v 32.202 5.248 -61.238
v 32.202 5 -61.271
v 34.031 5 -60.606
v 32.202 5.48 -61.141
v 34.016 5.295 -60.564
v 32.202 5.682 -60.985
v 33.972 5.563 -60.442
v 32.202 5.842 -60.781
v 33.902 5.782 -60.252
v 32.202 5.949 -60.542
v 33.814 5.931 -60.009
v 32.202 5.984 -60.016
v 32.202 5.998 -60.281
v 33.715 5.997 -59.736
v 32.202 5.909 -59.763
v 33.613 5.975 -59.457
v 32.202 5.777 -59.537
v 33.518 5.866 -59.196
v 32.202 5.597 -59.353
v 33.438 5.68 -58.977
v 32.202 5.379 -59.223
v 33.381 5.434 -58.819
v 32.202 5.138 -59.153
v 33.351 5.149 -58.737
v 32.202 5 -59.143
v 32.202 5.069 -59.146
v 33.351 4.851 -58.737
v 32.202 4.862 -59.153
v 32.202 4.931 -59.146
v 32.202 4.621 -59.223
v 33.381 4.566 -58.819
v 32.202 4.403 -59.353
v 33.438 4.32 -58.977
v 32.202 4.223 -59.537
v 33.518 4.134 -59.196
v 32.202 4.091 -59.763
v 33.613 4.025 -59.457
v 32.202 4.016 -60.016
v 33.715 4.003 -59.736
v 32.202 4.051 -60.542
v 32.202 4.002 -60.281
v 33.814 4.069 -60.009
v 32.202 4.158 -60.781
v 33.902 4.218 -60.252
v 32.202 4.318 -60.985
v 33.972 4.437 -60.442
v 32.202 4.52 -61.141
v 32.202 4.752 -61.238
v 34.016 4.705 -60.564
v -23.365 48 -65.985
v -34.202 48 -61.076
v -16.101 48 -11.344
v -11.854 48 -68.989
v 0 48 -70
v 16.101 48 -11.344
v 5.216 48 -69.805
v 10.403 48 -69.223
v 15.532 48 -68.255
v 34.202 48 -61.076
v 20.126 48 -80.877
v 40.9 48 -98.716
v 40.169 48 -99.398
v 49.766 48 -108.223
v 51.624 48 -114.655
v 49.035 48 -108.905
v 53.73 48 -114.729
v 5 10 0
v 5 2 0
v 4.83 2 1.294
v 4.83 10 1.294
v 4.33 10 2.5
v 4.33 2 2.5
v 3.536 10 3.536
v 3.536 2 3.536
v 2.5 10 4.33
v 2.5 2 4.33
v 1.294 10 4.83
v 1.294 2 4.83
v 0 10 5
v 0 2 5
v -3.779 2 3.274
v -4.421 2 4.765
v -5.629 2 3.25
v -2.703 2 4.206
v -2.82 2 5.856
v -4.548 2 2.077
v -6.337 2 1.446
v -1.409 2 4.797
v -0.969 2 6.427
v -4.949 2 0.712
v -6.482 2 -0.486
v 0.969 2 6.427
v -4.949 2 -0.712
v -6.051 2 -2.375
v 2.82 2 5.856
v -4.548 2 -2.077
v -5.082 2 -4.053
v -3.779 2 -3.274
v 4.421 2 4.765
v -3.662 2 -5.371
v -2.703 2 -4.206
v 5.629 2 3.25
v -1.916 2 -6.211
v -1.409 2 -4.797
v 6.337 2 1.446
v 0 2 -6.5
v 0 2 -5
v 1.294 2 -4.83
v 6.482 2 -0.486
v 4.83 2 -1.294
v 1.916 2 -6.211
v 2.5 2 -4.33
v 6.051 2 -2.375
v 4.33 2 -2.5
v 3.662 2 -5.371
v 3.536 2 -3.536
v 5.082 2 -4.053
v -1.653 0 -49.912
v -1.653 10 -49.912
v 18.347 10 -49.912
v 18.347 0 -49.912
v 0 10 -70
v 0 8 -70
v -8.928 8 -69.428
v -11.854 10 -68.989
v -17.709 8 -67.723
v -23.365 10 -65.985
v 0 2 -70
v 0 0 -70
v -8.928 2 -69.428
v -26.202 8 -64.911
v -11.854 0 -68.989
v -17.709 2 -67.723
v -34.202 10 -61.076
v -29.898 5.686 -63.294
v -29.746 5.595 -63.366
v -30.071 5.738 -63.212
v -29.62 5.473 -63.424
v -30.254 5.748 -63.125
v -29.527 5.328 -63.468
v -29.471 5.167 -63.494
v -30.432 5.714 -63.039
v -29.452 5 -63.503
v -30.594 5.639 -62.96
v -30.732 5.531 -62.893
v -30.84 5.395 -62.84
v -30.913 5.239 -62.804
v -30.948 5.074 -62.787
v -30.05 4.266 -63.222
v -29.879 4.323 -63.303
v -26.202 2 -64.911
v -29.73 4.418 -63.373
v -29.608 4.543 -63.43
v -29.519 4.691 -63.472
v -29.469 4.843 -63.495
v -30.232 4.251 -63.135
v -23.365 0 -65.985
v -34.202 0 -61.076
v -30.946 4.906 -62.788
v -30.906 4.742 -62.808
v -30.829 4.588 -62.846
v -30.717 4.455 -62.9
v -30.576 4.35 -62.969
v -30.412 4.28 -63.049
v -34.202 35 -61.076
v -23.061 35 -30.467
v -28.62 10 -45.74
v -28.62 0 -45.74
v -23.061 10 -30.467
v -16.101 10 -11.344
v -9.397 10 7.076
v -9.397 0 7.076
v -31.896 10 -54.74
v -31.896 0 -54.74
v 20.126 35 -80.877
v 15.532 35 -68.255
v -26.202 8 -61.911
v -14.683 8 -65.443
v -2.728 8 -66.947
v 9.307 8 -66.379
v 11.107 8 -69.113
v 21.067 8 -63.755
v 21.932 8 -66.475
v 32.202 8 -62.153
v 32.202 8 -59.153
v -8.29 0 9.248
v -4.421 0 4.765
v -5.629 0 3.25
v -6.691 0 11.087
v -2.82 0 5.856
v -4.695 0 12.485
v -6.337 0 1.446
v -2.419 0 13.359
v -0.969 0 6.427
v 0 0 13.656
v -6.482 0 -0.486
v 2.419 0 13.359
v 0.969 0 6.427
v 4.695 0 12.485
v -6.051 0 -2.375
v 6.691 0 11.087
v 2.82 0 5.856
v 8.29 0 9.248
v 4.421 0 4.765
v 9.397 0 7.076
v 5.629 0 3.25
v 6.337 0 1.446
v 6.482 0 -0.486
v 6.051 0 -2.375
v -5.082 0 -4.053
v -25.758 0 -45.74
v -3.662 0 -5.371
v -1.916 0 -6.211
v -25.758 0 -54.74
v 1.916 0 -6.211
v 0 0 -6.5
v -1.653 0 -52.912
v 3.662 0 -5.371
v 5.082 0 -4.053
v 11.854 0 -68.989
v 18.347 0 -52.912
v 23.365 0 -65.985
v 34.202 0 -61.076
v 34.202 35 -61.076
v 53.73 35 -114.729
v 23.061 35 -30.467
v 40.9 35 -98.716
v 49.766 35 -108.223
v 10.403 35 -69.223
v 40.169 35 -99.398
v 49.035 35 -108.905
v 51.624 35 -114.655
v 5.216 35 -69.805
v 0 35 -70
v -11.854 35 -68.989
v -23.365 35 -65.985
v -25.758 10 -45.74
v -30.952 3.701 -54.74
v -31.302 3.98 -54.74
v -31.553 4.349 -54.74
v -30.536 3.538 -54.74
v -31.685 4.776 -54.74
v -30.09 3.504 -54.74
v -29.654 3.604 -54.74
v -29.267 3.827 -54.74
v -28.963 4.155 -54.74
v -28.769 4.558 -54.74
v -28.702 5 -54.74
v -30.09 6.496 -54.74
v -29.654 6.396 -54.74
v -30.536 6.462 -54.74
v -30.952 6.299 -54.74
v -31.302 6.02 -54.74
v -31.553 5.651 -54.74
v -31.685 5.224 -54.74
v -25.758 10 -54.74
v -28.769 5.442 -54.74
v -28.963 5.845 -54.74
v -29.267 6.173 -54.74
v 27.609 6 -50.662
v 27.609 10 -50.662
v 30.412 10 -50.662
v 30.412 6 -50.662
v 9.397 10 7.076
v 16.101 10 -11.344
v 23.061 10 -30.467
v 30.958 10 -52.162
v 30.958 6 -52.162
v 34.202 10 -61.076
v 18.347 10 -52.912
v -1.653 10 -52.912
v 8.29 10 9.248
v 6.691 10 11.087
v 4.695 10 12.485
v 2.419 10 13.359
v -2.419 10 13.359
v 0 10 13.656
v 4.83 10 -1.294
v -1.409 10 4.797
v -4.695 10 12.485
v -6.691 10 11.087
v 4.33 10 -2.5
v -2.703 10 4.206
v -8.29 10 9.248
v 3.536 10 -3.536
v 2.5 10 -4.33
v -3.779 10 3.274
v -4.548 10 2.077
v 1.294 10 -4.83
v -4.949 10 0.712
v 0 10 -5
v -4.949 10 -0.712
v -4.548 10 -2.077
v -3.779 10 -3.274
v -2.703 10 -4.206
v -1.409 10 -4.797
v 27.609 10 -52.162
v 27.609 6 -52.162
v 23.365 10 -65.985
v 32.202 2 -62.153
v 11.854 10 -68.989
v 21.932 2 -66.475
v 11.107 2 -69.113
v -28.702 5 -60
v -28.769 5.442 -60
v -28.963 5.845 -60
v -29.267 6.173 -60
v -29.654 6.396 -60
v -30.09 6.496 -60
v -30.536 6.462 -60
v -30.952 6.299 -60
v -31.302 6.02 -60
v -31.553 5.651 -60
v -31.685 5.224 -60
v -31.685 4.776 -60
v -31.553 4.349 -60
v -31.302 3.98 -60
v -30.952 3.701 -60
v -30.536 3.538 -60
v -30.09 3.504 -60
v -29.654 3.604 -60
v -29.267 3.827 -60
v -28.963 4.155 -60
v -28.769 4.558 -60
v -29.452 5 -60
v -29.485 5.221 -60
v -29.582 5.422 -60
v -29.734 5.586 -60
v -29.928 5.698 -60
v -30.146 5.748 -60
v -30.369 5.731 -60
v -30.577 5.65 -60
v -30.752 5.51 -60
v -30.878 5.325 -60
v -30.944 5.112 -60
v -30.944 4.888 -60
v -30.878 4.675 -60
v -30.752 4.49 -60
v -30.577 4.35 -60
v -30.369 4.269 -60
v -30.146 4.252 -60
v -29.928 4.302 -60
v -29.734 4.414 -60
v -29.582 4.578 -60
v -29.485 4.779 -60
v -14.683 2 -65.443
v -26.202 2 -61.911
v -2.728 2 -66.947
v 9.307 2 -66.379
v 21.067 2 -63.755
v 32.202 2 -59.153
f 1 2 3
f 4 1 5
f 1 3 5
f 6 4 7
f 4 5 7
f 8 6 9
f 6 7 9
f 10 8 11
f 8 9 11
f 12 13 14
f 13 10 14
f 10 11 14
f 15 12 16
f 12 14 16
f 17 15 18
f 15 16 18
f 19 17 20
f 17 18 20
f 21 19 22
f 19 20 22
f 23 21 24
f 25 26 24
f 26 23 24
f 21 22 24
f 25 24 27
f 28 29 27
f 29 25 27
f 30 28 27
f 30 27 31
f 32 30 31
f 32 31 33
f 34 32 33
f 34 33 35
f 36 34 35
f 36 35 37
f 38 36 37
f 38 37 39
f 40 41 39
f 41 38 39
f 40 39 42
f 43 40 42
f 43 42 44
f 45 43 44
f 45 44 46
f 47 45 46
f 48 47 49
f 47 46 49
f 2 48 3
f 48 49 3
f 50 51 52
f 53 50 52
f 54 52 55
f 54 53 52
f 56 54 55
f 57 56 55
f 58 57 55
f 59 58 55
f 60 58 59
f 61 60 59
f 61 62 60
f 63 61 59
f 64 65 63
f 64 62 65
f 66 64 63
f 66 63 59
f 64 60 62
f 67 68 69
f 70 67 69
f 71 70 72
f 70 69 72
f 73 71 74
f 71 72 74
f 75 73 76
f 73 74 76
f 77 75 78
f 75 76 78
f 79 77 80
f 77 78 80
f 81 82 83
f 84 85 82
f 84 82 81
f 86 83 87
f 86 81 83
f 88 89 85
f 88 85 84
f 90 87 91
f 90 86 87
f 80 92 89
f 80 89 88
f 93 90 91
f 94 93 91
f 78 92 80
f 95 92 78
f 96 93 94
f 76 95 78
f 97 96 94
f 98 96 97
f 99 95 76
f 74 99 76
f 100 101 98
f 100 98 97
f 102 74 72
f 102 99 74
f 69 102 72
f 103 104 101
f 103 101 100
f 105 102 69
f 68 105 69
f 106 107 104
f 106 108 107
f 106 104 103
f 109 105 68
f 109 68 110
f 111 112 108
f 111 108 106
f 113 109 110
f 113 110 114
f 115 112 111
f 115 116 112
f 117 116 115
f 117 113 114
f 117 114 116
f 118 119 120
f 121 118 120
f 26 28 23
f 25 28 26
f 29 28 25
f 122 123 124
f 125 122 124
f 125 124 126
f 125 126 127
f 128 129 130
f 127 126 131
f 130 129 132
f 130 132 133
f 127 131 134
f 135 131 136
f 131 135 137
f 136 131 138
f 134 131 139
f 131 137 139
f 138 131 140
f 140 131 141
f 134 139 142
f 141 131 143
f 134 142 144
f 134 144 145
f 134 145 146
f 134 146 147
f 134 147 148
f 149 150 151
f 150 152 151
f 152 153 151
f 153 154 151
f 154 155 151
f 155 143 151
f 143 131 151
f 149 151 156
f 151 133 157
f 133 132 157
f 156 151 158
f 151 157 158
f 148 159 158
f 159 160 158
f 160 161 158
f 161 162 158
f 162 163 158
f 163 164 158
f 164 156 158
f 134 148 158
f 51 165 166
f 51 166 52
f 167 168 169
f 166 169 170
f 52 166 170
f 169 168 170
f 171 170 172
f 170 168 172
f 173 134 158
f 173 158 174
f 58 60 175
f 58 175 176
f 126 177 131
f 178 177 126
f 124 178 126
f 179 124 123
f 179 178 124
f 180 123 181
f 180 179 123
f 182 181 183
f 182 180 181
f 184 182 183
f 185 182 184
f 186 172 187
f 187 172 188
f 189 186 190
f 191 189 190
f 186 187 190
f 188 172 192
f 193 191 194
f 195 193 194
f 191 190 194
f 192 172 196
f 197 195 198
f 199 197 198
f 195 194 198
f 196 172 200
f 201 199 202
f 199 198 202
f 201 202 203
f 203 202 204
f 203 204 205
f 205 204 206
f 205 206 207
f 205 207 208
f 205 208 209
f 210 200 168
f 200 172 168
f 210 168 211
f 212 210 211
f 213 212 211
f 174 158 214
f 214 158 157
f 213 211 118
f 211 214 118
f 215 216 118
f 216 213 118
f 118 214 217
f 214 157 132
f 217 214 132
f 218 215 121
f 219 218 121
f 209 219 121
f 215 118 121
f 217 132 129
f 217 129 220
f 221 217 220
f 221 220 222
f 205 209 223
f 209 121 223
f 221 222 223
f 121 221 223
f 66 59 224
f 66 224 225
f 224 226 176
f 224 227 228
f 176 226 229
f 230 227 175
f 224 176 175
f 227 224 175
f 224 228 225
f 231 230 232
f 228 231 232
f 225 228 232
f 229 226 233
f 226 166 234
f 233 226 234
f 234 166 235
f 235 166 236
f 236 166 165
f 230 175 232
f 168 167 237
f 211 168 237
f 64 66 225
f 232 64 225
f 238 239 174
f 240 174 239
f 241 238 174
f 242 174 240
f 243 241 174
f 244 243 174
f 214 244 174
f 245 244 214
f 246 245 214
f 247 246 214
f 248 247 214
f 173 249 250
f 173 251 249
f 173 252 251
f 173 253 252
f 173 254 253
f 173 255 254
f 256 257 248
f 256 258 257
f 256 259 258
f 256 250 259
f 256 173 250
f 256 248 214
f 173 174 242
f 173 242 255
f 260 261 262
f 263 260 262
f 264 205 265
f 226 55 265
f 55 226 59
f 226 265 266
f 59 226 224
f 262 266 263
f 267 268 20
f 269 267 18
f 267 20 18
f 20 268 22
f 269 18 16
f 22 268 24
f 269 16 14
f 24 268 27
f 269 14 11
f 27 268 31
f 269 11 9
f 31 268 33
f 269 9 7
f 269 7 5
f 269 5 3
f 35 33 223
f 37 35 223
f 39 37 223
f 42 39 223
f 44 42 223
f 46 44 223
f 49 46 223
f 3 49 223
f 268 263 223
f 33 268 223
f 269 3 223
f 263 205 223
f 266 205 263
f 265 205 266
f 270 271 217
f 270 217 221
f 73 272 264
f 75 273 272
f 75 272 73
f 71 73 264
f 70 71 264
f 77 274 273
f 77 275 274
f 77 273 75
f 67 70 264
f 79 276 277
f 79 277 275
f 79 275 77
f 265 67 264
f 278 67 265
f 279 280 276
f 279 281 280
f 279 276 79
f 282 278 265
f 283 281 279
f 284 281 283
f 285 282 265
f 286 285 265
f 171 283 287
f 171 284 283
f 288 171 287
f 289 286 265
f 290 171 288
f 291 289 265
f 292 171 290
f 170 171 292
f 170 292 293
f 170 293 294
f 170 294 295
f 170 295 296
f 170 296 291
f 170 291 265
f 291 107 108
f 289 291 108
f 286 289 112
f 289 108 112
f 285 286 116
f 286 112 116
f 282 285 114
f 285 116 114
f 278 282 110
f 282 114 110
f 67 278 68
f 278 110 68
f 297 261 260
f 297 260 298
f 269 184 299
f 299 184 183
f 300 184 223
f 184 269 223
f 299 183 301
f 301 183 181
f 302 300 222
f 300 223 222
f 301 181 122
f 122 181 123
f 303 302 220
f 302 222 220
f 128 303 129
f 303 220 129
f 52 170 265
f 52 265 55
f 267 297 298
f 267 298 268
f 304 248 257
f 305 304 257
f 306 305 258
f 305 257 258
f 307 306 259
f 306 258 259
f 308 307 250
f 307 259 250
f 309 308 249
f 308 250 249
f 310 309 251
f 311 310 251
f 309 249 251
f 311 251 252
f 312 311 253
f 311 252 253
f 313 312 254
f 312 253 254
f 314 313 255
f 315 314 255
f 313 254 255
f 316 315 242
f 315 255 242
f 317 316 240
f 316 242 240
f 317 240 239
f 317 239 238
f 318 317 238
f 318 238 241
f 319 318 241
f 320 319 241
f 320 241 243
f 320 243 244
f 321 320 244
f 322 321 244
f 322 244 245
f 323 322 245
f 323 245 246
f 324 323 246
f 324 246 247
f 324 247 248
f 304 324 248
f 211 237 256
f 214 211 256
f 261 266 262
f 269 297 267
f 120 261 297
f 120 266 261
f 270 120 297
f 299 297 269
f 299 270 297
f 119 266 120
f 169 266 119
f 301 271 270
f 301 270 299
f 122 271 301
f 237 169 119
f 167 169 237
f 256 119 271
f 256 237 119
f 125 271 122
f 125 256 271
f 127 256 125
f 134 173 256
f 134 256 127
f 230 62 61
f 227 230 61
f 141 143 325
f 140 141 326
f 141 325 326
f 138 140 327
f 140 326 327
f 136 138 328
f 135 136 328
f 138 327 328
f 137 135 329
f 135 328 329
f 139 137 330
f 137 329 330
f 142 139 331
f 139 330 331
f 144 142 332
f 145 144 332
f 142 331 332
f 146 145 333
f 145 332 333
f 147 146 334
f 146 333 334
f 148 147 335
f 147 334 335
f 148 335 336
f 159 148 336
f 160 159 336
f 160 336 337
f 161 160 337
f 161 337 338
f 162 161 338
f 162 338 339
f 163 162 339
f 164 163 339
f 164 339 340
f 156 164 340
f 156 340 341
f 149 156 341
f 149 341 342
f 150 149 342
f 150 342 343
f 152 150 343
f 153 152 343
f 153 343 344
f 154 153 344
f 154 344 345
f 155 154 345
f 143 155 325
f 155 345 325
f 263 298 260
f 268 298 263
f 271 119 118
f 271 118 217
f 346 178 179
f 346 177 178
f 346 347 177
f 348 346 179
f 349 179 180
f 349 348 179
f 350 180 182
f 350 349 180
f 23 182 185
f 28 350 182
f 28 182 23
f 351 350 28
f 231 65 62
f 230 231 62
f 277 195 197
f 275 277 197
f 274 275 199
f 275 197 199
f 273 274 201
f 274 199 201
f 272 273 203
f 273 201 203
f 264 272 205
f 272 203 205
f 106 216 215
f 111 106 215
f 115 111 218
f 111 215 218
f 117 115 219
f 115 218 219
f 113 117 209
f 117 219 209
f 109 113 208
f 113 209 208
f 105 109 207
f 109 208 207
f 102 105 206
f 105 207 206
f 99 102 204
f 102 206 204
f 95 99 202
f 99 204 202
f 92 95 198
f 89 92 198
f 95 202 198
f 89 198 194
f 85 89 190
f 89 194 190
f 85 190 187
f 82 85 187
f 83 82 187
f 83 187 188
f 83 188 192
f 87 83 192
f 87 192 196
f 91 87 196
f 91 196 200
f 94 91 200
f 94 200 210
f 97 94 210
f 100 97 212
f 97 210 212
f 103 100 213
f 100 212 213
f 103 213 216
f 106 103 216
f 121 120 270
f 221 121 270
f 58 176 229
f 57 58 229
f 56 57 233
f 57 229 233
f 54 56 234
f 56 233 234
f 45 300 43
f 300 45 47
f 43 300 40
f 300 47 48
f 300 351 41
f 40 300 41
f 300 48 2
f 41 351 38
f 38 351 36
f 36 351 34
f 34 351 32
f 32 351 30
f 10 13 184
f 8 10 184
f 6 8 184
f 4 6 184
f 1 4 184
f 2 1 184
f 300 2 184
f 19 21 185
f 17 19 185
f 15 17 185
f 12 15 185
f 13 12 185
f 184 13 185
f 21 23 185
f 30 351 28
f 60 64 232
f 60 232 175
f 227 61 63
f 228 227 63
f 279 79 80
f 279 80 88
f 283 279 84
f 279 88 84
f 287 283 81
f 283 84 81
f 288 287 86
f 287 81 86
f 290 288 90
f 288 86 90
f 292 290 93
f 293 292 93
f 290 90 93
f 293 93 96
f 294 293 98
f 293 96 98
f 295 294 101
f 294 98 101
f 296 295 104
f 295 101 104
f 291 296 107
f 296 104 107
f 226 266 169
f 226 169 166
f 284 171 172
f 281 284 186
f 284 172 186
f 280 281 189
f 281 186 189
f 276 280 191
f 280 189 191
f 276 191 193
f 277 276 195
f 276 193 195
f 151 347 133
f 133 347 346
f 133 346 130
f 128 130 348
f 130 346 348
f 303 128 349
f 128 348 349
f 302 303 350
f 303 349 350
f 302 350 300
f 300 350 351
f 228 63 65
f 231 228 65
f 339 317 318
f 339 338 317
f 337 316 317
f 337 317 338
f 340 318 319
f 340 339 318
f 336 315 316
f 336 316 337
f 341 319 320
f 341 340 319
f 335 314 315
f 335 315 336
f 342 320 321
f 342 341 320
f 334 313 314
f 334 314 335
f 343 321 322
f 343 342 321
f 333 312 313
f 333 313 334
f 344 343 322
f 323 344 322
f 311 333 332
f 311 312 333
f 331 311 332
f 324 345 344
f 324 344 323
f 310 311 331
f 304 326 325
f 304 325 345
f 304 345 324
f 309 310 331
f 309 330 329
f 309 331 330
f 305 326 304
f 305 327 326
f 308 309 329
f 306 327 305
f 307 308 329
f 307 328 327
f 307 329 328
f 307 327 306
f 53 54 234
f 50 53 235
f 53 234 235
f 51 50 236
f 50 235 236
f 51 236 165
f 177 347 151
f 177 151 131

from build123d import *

# Parameters (mm, degrees)
EXTRUDE_1_DEPTH            = 48
CUT_EXTRUDE_2_REACH        = 96.508
CUT_EXTRUDE_2_START_RADIUS = 70
CUT_EXTRUDE_2_END_RADIUS   = 70
SKETCH_3_W                 = 58.404028666
SKETCH_3_H                 = 6
EXTRUDE_2_DEPTH            = 13
CUT_EXTRUDE_3_DEPTH        = 140.034418617
CUT_EXTRUDE_3_DEPTH_BACK   = 140.034418617
SKETCH_4_W                 = 25
SKETCH_4_H                 = 38
SKETCH_4_W_2               = 40
SKETCH_4_H_2               = 25
CHAMFER_1_SIZE             = 5
CHAMFER_1_SIZE2            = 3.813196151
SKETCH_6_R                 = 6.5
CUT_EXTRUDE_4_DEPTH        = 2
SKETCH_7_R                 = 1.5
CUT_EXTRUDE_5_DEPTH        = 60
SKETCH_8_W                 = 9
SKETCH_8_H                 = 9
CUT_EXTRUDE_6_DEPTH        = 11
CUT_EXTRUDE_8_REACH        = 137.533
SKETCH_10_R                = 1
CUT_EXTRUDE_9_REACH        = 105.034
CUT_EXTRUDE_9_END_RADIUS   = 70
SKETCH_11_R                = 0.75
SKETCH_12_W                = 20
SKETCH_12_H                = 3
CUT_EXTRUDE_10_DEPTH       = 11
SKETCH_13_W                = 3.868283576
SKETCH_13_H                = 1.5
CUT_EXTRUDE_11_DEPTH       = 4
CUT_EXTRUDE_12_REACH       = 137.476


with BuildPart() as part:
    # 草图1 → 凸台-拉伸1 (new body)
    with BuildSketch(Plane(origin=(0, 0, 0), x_dir=(1, 0, 0), z_dir=(0, 1, 0))):
        with BuildLine():
            ThreePointArc((-9.396926208, -7.075874358), (-5.735764364, -11.847193368), (0, -13.655672925))
            Line((0, -13.655672925), (0, -5))
            ThreePointArc((0, -5), (-5, 0), (0, 5))
            Line((0, 5), (0, 70))
            ThreePointArc((0, 70), (-17.673593853, 67.732149533), (-34.202014333, 61.075545152))
            Line((-34.202014333, 61.075545152), (-9.396926208, -7.075874358))
        make_face()
        with BuildLine():
            Line((0, -5), (0, -13.655672925))
            ThreePointArc((0, -13.655672925), (5.735764364, -11.847193368), (9.396926208, -7.075874358))
            Line((9.396926208, -7.075874358), (34.202014333, 61.075545152))
            ThreePointArc((34.202014333, 61.075545152), (17.673593853, 67.732149533), (0, 70))
            Line((0, 70), (0, 5))
            ThreePointArc((0, 5), (3.535533906, 3.535533906), (5, 0))
            ThreePointArc((5, 0), (3.535533906, -3.535533906), (0, -5))
        make_face()
    extrude(amount=EXTRUDE_1_DEPTH)

    # 切除-拉伸2: from a cylinder face, 96.508 long prism both ways, kept between that surface and its translate by the depth
    cut_extrude_2_start = Plane(origin=(0, 5, 0), z_dir=(0, -1, 0)) * Cylinder(CUT_EXTRUDE_2_START_RADIUS, 334.016, mode=Mode.PRIVATE)
    cut_extrude_2_end = Plane(origin=(0, 5, 3), z_dir=(0, -1, 0)) * Cylinder(CUT_EXTRUDE_2_END_RADIUS, 334.016, mode=Mode.PRIVATE)
    # 草图3 → 切除-拉伸2 (cut, from a surface)
    with BuildSketch(Plane.XY, mode=Mode.PRIVATE) as cut_extrude_2_sk1:
        with Locations((3, 5)):
            Rectangle(SKETCH_3_W, SKETCH_3_H)
    cut_extrude_2_tool1 = extrude(cut_extrude_2_sk1.sketch, amount=CUT_EXTRUDE_2_REACH, both=True, mode=Mode.PRIVATE)
    add(((cut_extrude_2_tool1 & cut_extrude_2_start) - cut_extrude_2_end).solids().sort_by_distance((3, 5, -62.032204))[0], mode=Mode.SUBTRACT)

    # 草图2 → 凸台-拉伸2 (add)
    with BuildSketch(Plane(origin=(0, 48, 0), x_dir=(1, 0, 0), z_dir=(0, 1, 0))):
        Polygon((24.252642572, 33.739870901), (55.034455471, 118.312206771), (20.125623779, 80.877067961), (5.458790156, 40.580273767), align=None)
    extrude(amount=-EXTRUDE_2_DEPTH)

    # 草图4 → 切除-拉伸3 (cut, two sides: drawn at the far end of the back side and taken through both)
    with BuildSketch(Plane(origin=(0, 0, 0), x_dir=(0, 0, -1), z_dir=(1, 0, 0)).offset(-CUT_EXTRUDE_3_DEPTH_BACK)):
        with Locations((-1.155672925, 29)):
            Rectangle(SKETCH_4_W, SKETCH_4_H)
        with Locations((50.466884927, 22.5)):
            Rectangle(SKETCH_4_W_2, SKETCH_4_H_2)
    extrude(amount=CUT_EXTRUDE_3_DEPTH + CUT_EXTRUDE_3_DEPTH_BACK, mode=Mode.SUBTRACT)

    # 倒角1
    chamfer_1_edges = [part.edges().sort_by_distance(p)[0] for p in [
        (55.034455471, 41.5, -118.312206771),
    ]]
    chamfer_1_side = [part.faces().sort_by_distance(p)[0] for p in [
        (37.580039625, 41.5, -99.594637366),
    ]]
    chamfer(chamfer_1_edges, length=CHAMFER_1_SIZE, length2=CHAMFER_1_SIZE2, reference=chamfer_1_side[0])

    # 草图6 → 切除-拉伸4 (cut)
    with BuildSketch(Plane.XZ):
        with Locations(Location((0, 0, 0), (0, 0, 270))):
            Circle(SKETCH_6_R)
    extrude(amount=-CUT_EXTRUDE_4_DEPTH, mode=Mode.SUBTRACT)

    # 草图7 → 切除-拉伸5 (cut)
    with BuildSketch(Plane.XY):
        with Locations((-30.202014333, 5)):
            Circle(SKETCH_7_R)
    extrude(amount=-CUT_EXTRUDE_5_DEPTH, mode=Mode.SUBTRACT)

    # 草图8 → 切除-拉伸6 (cut)
    with BuildSketch(Plane(origin=(0, 10, 0), x_dir=(1, 0, 0), z_dir=(0, 1, 0))):
        with Locations((-30.258231885, 50.240091929)):
            Rectangle(SKETCH_8_W, SKETCH_8_H)
    extrude(amount=-CUT_EXTRUDE_6_DEPTH, mode=Mode.SUBTRACT)

    # 切除-拉伸8: up to this plane
    cut_extrude_8_end = Plane(origin=(32.202014333, 48, -62.153280468), z_dir=(-1, 0, 0))
    # 草图10 → 切除-拉伸8 (cut, up to the surface)
    with BuildSketch(Plane(origin=(10.571836839, 0, 3.847833931), x_dir=(0.34202014332566283, 0, -0.9396926207859106), z_dir=(0.9396926207859106, 0, 0.34202014332566283)), mode=Mode.PRIVATE) as cut_extrude_8_sk1:
        with Locations((67.590016934, 5)):
            Circle(SKETCH_10_R)
    cut_extrude_8_tool1 = split(extrude(cut_extrude_8_sk1.sketch, amount=-CUT_EXTRUDE_8_REACH, mode=Mode.PRIVATE), bisect_by=cut_extrude_8_end, keep=Keep.BOTH, mode=Mode.PRIVATE)
    add(cut_extrude_8_tool1.solids().sort_by_distance((33.688984, 5, -59.666006))[0], mode=Mode.SUBTRACT)

    # 切除-拉伸9: up to this cylinder (the profile starts inside it)
    cut_extrude_9_end = Plane(origin=(0, 5, 0), z_dir=(0, -1, 0)) * Cylinder(CUT_EXTRUDE_9_END_RADIUS, 351.068, mode=Mode.PRIVATE)
    # 草图11 → 切除-拉伸9 (cut, up to the surface)
    with BuildSketch(Plane.XY.offset(-60), mode=Mode.PRIVATE) as cut_extrude_9_sk1:
        with Locations((-30.202014333, 5)):
            Circle(SKETCH_11_R)
    cut_extrude_9_tool1 = extrude(cut_extrude_9_sk1.sketch, amount=-CUT_EXTRUDE_9_REACH, mode=Mode.PRIVATE) & cut_extrude_9_end
    add(cut_extrude_9_tool1.solids().sort_by_distance((-30.202014, 5, -60))[0], mode=Mode.SUBTRACT)

    # 草图12 → 切除-拉伸10 (cut)
    with BuildSketch(Plane(origin=(0, 10, 0), x_dir=(1, 0, 0), z_dir=(0, 1, 0))):
        with Locations((8.346963974, 51.411545488)):
            Rectangle(SKETCH_12_W, SKETCH_12_H)
    extrude(amount=-CUT_EXTRUDE_10_DEPTH, mode=Mode.SUBTRACT)

    # 草图13 → 切除-拉伸11 (cut)
    with BuildSketch(Plane(origin=(0, 10, 0), x_dir=(1, 0, 0), z_dir=(0, 1, 0))):
        with Locations((29.542762739, 51.411545488)):
            Rectangle(SKETCH_13_W, SKETCH_13_H)
    extrude(amount=-CUT_EXTRUDE_11_DEPTH, mode=Mode.SUBTRACT)

    # 草图14 → 切除-拉伸12 (cut, up to next)
    with BuildSketch(Plane(origin=(0, 48, 0), x_dir=(1, 0, 0), z_dir=(0, 1, 0)), mode=Mode.PRIVATE) as cut_extrude_12_sk1:
        Polygon((49.766128767, 108.223290792), (49.034775066, 108.905289152), (40.168796385, 99.397691031), (40.900150086, 98.715692671), align=None)
    cut_extrude_12_tool1 = extrude(cut_extrude_12_sk1.sketch, amount=-CUT_EXTRUDE_12_REACH, mode=Mode.PRIVATE) & part.part
    add(cut_extrude_12_tool1.solids().sort_by_distance((44.967463, 48, -103.810491))[0], mode=Mode.SUBTRACT)


solid = part.part
